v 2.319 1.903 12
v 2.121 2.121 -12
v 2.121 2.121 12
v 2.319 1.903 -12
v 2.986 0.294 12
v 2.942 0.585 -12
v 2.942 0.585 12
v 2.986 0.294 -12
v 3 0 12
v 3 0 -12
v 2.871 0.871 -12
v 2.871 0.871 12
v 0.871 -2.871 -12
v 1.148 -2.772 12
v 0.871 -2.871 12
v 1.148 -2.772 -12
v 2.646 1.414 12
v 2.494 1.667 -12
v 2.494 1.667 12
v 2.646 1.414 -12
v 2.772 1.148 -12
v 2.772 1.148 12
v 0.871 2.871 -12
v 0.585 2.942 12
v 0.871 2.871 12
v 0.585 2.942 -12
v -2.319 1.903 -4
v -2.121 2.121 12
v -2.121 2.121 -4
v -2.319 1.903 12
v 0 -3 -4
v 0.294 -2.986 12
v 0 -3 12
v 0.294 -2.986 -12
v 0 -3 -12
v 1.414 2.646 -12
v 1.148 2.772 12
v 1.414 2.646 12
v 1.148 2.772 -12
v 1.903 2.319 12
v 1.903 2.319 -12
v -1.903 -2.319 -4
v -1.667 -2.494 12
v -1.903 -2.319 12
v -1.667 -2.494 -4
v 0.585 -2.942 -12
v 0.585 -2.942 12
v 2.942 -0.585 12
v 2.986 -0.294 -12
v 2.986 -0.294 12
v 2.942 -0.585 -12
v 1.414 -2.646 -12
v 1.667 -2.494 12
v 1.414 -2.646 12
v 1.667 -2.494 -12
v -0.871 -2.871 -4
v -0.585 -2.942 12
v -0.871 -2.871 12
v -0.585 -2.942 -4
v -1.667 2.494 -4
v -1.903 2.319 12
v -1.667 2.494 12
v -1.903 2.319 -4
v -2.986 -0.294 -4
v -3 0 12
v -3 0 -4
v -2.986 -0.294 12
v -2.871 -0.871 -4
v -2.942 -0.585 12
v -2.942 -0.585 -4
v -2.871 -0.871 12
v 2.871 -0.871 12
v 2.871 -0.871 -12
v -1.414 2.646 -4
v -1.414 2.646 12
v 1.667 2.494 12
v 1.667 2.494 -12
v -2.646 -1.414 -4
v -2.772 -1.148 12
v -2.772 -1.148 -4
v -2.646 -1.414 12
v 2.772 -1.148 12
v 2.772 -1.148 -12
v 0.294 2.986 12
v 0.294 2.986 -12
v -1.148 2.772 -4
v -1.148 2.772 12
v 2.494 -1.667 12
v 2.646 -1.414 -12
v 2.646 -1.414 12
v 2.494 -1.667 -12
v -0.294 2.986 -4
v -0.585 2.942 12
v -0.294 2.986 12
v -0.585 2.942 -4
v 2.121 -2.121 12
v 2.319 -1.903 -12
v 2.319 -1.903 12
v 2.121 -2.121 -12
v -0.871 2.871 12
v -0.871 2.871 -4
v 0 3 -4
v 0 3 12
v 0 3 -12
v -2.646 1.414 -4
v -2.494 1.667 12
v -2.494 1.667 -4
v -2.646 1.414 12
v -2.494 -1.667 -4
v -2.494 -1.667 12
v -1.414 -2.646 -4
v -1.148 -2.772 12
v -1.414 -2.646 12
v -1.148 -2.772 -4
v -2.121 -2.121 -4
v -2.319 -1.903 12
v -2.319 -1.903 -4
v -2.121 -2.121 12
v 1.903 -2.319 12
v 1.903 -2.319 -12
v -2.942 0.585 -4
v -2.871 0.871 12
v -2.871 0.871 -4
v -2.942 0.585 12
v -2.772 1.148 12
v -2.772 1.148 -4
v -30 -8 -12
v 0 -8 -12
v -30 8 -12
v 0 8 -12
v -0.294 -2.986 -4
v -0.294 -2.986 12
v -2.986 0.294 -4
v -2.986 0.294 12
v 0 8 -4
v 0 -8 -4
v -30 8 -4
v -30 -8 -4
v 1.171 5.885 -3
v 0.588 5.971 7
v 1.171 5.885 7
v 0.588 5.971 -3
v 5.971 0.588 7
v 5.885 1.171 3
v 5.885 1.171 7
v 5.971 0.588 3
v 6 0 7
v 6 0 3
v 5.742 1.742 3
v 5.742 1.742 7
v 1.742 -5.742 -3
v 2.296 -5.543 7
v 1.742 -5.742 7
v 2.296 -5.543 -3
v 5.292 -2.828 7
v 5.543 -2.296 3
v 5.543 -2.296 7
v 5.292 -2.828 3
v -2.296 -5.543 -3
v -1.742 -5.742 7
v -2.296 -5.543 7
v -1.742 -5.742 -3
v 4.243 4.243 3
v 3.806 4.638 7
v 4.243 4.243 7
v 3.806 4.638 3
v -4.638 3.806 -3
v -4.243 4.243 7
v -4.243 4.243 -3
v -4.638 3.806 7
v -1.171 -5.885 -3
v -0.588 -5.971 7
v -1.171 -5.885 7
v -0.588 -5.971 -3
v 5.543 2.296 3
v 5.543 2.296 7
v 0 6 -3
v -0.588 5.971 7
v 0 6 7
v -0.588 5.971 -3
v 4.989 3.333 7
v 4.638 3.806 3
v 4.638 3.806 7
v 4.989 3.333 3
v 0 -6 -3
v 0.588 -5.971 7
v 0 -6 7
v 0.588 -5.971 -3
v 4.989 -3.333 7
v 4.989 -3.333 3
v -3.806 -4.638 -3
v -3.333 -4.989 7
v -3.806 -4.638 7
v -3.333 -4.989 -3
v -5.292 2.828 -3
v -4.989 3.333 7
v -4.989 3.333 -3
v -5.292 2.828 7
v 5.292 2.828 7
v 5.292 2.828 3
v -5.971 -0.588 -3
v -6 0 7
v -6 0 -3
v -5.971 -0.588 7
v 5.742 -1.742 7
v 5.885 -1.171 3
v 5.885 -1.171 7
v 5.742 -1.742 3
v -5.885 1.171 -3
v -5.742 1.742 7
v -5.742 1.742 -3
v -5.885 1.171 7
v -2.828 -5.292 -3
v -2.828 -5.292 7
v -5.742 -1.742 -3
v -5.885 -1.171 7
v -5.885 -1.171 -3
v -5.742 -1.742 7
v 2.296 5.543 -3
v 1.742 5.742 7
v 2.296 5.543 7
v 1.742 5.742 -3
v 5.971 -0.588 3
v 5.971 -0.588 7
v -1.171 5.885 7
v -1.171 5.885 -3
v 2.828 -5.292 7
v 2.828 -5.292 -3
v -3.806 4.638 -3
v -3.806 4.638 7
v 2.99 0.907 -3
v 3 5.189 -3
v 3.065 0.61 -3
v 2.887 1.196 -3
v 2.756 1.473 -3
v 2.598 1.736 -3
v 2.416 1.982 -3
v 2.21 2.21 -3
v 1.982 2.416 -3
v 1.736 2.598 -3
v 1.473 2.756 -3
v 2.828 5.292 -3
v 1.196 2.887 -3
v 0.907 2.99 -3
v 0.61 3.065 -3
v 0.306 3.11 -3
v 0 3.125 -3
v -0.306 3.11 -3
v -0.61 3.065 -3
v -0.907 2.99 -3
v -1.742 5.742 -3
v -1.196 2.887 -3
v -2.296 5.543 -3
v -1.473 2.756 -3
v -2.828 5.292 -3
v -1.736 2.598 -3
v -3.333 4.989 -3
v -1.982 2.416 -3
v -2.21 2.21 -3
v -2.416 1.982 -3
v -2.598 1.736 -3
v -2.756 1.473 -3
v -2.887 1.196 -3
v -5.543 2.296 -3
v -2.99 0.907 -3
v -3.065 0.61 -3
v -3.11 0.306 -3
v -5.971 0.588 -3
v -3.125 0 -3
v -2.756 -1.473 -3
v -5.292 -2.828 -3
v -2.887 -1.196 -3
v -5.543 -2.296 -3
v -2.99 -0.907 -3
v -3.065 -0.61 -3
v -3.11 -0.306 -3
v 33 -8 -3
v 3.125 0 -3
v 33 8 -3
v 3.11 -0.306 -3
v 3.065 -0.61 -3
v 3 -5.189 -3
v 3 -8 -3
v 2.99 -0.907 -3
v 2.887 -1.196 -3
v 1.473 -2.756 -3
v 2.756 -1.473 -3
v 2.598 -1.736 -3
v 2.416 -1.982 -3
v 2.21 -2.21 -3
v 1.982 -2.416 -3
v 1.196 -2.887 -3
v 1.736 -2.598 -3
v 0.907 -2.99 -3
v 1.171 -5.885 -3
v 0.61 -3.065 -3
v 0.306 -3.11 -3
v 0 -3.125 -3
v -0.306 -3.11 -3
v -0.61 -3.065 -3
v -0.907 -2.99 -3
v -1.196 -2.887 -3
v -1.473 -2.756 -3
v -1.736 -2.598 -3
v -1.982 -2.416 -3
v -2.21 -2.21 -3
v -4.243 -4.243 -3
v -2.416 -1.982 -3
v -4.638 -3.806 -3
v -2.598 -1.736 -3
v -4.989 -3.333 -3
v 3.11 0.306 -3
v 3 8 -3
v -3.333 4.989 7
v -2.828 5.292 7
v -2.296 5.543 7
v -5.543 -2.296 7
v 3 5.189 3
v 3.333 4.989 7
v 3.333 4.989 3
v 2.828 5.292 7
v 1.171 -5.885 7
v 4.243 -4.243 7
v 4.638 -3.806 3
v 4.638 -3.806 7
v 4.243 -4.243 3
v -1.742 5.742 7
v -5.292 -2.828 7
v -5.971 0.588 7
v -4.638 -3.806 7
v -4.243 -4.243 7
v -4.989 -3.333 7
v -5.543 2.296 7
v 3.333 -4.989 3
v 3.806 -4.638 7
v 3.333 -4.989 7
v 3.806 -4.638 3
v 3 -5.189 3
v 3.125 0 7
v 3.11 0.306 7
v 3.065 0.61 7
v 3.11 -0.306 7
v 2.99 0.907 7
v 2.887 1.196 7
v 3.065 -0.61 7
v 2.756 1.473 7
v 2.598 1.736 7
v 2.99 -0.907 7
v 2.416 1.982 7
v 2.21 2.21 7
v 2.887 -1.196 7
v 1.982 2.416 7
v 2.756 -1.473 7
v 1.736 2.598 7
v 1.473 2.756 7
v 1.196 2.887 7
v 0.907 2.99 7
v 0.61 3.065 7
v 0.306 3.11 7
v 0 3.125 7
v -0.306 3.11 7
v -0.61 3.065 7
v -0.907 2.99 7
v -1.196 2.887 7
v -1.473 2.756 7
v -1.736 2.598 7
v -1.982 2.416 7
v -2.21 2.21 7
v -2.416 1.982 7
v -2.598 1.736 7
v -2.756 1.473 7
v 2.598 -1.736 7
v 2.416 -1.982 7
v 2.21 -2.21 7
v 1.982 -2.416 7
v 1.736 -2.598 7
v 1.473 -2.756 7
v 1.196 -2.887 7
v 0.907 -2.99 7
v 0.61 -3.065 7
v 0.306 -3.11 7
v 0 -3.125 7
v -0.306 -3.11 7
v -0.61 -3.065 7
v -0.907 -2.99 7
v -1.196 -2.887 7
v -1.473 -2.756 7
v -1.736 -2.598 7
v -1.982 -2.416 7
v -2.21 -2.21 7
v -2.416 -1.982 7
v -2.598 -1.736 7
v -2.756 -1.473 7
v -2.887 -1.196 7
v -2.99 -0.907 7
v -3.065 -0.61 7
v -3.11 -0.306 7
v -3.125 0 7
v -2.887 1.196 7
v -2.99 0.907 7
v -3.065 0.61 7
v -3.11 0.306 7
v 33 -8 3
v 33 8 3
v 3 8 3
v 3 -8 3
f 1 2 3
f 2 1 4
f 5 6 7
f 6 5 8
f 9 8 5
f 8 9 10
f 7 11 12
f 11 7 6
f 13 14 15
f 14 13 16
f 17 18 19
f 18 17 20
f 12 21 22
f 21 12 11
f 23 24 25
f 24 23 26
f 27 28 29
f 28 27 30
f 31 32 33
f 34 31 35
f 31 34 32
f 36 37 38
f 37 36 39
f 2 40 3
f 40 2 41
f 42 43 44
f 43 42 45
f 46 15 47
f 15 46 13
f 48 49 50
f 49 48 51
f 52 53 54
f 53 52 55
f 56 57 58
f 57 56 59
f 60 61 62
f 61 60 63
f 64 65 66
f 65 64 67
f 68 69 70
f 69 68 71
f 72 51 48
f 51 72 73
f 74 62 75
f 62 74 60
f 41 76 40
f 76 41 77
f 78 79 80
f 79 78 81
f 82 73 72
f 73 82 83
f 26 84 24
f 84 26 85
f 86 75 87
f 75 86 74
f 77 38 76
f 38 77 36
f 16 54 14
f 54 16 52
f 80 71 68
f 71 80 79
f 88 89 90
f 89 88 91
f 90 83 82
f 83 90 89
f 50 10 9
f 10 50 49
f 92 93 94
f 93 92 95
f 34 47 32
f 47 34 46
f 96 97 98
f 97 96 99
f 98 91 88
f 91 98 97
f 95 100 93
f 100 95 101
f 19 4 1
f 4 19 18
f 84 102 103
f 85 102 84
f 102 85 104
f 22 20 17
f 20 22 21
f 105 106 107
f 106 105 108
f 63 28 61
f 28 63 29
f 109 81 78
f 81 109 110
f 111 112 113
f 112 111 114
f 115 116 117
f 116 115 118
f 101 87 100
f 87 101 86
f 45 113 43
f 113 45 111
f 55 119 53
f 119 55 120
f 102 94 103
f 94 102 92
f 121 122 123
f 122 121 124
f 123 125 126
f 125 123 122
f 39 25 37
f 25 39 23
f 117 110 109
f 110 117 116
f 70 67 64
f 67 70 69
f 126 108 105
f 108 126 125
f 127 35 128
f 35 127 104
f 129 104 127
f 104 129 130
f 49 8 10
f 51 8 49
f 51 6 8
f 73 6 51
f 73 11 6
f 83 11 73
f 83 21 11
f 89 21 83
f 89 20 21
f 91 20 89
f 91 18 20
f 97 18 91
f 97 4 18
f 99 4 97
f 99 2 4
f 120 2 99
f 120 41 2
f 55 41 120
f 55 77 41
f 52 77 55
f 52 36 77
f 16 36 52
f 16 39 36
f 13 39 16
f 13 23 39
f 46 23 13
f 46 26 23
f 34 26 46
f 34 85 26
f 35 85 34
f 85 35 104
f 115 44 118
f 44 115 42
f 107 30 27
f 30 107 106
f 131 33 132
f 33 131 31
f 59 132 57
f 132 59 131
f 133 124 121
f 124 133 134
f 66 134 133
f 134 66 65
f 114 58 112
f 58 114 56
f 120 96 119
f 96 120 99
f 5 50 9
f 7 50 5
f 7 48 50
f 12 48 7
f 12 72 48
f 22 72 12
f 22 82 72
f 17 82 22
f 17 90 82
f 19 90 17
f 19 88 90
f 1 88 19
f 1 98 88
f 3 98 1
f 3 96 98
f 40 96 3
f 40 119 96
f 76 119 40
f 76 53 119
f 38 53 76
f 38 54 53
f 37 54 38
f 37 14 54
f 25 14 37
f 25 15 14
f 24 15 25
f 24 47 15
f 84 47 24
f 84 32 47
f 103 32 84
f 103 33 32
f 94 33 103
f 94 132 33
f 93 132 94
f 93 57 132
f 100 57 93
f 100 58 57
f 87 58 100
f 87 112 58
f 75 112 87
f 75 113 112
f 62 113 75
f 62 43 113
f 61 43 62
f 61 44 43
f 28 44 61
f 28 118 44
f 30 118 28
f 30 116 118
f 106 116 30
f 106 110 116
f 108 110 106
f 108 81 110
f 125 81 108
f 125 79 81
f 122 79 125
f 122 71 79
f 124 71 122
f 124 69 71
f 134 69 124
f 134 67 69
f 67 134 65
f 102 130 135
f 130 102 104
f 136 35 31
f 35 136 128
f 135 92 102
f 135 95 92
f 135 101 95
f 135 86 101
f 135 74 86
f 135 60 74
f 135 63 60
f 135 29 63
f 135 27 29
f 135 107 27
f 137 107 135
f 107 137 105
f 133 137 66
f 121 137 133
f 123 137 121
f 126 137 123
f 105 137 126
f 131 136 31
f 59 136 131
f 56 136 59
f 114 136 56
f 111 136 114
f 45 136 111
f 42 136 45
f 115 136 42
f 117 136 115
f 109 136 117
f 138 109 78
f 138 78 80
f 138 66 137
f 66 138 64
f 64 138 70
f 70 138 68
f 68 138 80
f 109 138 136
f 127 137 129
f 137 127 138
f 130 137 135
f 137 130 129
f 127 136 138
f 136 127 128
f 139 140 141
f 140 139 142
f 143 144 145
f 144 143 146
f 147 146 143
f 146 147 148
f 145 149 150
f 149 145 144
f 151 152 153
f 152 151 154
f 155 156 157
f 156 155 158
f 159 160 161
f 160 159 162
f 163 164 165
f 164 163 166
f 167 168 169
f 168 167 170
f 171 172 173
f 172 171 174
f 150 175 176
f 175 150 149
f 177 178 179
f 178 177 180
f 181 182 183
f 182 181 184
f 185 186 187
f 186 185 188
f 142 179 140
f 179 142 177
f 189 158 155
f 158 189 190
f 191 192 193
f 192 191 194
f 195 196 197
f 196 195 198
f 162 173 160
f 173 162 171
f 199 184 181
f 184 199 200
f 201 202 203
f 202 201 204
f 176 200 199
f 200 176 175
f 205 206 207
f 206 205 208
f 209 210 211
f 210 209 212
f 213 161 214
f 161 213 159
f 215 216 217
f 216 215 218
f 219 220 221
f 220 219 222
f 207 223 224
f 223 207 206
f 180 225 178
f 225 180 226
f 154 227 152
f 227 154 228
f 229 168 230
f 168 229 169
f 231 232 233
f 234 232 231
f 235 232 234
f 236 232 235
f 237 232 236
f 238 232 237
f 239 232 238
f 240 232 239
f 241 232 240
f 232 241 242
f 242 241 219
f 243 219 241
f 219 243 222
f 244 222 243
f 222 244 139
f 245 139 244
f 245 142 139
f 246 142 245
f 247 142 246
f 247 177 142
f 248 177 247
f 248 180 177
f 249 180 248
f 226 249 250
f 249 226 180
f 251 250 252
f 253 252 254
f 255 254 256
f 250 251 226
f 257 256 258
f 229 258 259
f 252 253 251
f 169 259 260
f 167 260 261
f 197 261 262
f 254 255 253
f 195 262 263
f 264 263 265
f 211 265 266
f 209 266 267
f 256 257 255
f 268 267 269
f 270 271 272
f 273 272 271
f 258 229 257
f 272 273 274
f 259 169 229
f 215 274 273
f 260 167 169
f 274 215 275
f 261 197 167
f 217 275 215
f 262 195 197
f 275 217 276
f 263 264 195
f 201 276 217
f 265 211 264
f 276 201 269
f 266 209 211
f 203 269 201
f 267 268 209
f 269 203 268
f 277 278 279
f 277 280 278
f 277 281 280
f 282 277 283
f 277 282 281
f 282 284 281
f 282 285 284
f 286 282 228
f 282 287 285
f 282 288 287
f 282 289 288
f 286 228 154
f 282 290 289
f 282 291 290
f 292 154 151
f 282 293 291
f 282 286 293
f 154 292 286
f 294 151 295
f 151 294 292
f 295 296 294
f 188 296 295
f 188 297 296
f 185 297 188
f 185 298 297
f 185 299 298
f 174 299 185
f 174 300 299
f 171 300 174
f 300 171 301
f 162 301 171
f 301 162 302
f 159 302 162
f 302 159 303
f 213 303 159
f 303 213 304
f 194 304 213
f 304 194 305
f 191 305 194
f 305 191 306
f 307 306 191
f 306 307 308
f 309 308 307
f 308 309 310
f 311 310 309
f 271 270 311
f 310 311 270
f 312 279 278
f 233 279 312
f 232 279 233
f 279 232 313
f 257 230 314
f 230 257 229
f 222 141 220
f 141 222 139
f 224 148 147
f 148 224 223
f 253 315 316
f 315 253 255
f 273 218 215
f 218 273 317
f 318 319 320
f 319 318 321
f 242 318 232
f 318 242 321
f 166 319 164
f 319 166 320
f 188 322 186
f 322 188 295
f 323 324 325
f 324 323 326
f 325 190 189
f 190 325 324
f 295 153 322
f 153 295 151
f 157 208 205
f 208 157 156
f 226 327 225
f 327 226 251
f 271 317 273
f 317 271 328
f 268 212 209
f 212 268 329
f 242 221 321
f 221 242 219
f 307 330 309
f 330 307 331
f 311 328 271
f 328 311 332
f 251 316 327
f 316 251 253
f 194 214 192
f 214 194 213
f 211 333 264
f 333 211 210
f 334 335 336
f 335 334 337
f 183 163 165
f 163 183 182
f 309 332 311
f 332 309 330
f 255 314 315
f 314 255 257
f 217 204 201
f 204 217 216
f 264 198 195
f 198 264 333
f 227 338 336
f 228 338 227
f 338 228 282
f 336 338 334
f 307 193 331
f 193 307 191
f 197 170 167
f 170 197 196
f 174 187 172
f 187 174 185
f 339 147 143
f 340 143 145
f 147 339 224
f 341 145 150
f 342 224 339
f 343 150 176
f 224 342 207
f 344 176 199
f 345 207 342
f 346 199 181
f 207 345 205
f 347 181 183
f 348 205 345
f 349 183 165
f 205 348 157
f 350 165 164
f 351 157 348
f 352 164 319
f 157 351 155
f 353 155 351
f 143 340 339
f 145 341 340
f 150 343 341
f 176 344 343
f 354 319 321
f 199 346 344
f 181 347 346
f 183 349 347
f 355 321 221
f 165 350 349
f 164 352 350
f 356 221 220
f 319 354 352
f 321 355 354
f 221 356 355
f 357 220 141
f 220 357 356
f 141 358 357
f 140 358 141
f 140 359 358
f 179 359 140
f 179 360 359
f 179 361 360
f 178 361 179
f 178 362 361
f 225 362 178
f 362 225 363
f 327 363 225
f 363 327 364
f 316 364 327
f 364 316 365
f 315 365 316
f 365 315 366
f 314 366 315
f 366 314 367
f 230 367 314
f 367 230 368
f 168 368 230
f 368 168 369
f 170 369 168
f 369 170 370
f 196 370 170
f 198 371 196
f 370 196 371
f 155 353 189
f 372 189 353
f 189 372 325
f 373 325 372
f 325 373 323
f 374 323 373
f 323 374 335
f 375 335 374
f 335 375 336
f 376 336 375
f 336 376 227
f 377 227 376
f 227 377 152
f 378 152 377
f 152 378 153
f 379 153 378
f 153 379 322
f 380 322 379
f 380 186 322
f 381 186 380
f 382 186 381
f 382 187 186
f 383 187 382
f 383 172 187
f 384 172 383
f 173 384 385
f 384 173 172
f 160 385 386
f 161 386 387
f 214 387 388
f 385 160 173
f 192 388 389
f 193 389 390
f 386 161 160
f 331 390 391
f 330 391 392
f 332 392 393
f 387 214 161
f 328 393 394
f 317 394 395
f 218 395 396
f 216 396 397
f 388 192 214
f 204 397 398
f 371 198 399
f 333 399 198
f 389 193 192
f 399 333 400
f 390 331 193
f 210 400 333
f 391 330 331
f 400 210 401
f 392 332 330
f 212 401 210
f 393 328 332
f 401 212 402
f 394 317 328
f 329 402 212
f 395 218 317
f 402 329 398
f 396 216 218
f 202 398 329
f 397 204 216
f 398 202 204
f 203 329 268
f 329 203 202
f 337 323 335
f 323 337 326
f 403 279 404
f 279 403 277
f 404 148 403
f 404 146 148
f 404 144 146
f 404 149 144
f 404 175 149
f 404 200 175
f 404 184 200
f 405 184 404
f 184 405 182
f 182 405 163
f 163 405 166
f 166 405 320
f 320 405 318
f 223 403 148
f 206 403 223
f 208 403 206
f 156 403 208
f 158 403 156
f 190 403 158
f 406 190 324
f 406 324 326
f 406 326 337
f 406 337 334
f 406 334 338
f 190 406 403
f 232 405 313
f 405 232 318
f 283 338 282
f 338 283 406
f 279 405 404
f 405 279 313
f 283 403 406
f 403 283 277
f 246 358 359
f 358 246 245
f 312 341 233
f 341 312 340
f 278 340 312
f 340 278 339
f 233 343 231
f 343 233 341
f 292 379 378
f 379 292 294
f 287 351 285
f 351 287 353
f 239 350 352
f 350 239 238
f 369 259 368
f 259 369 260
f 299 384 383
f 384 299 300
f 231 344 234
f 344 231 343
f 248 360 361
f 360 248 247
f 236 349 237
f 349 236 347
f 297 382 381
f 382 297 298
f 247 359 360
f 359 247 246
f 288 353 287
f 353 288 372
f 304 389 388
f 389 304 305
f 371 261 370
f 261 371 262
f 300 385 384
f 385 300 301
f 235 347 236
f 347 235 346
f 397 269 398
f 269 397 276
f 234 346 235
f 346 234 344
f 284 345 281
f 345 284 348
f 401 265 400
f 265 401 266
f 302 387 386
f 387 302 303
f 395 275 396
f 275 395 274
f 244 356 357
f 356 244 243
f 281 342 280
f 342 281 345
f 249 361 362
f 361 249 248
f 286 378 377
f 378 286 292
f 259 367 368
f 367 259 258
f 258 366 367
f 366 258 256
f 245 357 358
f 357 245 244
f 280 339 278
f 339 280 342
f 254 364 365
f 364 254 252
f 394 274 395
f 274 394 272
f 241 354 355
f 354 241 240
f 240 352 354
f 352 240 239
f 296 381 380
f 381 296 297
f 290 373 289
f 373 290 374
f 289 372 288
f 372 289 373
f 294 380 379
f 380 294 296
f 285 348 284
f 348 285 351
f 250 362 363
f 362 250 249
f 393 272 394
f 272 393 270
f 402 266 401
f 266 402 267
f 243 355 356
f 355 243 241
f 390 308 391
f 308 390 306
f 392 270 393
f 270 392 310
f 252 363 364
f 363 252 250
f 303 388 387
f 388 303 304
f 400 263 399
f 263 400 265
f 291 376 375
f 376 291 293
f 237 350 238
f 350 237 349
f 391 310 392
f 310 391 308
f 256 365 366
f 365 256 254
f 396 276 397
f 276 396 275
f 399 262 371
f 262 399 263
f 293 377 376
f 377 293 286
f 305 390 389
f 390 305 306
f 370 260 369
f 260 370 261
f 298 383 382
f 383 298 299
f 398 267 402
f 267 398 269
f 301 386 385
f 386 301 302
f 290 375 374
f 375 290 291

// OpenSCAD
agentscad_part = "all";
hinge_angle = 0;

pin_d = 6;
hole_d = 6.25;
sleeve_od = 12;

$fn = 64;

module fixed() {
    union() {
        translate([0, 0, -12])
            cylinder(h = 24, d = pin_d, $fn = 64);

        translate([-30, -8, -12])
            cube([30, 16, 8]);
    }
}

module moving() {
    rotate([0, 0, hinge_angle]) {
        difference() {
            union() {
                translate([0, 0, -3])
                    cylinder(h = 10, d = sleeve_od, $fn = 64);

                translate([3, -8, -3])
                    cube([30, 16, 6]);
            }

            translate([0, 0, -4])
                cylinder(h = 12, d = hole_d, $fn = 64);
        }
    }
}

if (agentscad_part == "all" || agentscad_part == "fixed") fixed();
if (agentscad_part == "all" || agentscad_part == "moving") moving();
